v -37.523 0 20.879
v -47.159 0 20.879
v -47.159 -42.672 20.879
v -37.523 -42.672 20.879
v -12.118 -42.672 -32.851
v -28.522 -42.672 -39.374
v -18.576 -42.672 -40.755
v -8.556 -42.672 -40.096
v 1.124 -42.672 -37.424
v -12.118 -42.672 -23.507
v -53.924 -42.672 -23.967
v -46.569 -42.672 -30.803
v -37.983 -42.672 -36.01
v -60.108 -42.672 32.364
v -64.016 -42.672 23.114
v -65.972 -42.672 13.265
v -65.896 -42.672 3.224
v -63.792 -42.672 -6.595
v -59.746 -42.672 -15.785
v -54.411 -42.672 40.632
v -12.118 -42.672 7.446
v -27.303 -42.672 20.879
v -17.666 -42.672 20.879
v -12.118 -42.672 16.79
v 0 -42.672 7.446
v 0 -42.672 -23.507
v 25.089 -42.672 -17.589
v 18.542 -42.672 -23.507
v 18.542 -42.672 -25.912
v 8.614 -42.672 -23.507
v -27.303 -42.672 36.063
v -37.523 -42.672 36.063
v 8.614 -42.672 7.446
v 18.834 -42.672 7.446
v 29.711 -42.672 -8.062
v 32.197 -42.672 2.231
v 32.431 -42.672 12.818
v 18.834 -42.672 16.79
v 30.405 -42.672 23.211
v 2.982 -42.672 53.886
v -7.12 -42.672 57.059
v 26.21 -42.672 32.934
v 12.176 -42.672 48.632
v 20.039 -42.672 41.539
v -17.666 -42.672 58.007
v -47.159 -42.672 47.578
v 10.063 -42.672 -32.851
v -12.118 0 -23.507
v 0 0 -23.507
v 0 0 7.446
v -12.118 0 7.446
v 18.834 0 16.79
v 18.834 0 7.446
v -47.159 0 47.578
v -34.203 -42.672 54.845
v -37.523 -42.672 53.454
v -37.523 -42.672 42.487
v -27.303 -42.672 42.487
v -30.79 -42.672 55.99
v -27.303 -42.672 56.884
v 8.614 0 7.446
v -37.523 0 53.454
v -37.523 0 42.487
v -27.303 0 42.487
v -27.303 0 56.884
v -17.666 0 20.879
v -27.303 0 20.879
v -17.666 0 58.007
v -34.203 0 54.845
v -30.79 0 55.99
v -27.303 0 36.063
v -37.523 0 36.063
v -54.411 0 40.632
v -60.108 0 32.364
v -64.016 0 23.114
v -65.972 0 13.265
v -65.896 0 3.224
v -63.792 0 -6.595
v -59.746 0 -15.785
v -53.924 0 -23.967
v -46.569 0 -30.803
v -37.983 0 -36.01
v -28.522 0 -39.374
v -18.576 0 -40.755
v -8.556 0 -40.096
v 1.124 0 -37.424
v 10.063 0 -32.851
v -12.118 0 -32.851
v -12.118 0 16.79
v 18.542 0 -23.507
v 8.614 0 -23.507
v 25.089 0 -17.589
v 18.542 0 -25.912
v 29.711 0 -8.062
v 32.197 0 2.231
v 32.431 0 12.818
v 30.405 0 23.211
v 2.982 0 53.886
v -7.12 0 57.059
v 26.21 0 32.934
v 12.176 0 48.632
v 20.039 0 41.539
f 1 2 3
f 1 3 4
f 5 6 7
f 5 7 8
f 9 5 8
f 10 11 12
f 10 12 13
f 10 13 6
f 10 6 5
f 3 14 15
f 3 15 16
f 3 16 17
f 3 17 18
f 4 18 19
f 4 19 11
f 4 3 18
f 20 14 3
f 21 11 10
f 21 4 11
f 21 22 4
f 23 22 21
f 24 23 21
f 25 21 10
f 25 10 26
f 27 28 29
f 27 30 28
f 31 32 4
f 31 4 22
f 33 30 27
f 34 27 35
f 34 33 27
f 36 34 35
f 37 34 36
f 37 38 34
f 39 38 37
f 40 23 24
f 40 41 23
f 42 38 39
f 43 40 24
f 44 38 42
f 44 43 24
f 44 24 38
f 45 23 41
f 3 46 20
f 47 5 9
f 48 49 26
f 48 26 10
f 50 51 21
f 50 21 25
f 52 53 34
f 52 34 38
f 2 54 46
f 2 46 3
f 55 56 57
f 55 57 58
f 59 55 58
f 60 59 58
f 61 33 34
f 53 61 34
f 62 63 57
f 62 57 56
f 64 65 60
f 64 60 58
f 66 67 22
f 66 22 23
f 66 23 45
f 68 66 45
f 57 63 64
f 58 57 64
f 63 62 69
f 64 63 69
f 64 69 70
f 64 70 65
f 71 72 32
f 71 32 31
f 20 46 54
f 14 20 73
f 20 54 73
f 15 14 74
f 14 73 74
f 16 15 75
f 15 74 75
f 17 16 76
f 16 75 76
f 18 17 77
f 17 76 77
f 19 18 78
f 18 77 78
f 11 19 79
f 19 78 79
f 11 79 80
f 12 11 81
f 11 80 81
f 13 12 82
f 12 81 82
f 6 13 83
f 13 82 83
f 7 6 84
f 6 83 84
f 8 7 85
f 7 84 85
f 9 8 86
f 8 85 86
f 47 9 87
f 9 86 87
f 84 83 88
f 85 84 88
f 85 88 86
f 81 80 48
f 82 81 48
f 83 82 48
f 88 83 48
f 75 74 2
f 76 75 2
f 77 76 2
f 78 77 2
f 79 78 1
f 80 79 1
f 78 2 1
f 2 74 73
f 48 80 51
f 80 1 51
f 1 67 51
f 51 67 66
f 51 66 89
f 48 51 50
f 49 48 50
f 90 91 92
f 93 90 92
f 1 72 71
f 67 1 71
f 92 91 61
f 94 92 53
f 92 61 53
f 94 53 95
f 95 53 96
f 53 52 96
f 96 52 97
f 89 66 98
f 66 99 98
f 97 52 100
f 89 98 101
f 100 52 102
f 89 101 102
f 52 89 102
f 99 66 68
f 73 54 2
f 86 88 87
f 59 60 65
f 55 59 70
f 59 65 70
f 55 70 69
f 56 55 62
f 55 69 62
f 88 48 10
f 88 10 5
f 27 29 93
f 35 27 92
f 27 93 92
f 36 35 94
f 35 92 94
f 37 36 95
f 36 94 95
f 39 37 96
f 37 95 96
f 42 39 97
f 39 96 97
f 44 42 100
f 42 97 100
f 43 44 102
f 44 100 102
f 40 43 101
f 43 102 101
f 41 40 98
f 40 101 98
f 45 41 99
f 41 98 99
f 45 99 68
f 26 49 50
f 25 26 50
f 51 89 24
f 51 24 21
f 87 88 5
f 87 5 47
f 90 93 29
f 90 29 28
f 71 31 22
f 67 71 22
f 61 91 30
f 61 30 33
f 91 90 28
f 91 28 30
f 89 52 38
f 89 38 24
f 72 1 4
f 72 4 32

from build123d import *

# Parameters (mm, degrees)
F0_R     = 49.4010411081
F1_DEPTH = 42.672
F2_W     = 8.6142150685
F2_H     = 30.9527735226
F2_W_2   = 10.2202557027
F2_H_2   = 6.4241588116
F3_DEPTH = 57.404


with BuildPart() as f1:
    # F0 (on Front) → F1 (new body)
    with BuildSketch(Plane.XZ):
        with Locations((-16.7904179543, 8.6142159998)):
            Circle(F0_R)
    extrude(amount=F1_DEPTH)

    # F2 (on Front) → F3 (cut)
    with BuildSketch(Plane.XZ):
        with Locations((4.3071075343, -8.0302006099)):
            Rectangle(F2_W, F2_H)
        with Locations((-32.4128102511, 39.274983108)):
            Rectangle(F2_W_2, F2_H_2)
        Polygon((-12.1183022857, 7.4461861514), (0, 7.4461861514), (8.6142150685, 7.4461861514), (18.8344717026, 7.4461861514), (18.8344717026, 16.790419817), (-12.1183022857, 16.790419817), align=None)
        Polygon((0, -23.5065873712), (-12.1183022857, -23.5065873712), (-12.1183022857, -32.8508205712), (18.5424648225, -32.8508205712), (18.5424648225, -23.5065873712), (8.6142150685, -23.5065873712), align=None)
        Polygon((-27.3026823997, 58.8394701481), (-27.3026823997, 42.4870625138), (-27.3026823997, 36.0629037023), (-27.3026823997, 20.8785217255), (-17.6664423198, 20.8785217255), (-17.6664423198, 58.8394701481), align=None)
        Polygon((-37.5229381025, 57.6714426279), (-47.1591800451, 57.6714426279), (-47.1591800451, 20.8785217255), (-37.5229381025, 20.8785217255), (-37.5229381025, 36.0629037023), (-37.5229381025, 42.4870625138), align=None)
    extrude(amount=F3_DEPTH, mode=Mode.SUBTRACT)


solid = f1.part
